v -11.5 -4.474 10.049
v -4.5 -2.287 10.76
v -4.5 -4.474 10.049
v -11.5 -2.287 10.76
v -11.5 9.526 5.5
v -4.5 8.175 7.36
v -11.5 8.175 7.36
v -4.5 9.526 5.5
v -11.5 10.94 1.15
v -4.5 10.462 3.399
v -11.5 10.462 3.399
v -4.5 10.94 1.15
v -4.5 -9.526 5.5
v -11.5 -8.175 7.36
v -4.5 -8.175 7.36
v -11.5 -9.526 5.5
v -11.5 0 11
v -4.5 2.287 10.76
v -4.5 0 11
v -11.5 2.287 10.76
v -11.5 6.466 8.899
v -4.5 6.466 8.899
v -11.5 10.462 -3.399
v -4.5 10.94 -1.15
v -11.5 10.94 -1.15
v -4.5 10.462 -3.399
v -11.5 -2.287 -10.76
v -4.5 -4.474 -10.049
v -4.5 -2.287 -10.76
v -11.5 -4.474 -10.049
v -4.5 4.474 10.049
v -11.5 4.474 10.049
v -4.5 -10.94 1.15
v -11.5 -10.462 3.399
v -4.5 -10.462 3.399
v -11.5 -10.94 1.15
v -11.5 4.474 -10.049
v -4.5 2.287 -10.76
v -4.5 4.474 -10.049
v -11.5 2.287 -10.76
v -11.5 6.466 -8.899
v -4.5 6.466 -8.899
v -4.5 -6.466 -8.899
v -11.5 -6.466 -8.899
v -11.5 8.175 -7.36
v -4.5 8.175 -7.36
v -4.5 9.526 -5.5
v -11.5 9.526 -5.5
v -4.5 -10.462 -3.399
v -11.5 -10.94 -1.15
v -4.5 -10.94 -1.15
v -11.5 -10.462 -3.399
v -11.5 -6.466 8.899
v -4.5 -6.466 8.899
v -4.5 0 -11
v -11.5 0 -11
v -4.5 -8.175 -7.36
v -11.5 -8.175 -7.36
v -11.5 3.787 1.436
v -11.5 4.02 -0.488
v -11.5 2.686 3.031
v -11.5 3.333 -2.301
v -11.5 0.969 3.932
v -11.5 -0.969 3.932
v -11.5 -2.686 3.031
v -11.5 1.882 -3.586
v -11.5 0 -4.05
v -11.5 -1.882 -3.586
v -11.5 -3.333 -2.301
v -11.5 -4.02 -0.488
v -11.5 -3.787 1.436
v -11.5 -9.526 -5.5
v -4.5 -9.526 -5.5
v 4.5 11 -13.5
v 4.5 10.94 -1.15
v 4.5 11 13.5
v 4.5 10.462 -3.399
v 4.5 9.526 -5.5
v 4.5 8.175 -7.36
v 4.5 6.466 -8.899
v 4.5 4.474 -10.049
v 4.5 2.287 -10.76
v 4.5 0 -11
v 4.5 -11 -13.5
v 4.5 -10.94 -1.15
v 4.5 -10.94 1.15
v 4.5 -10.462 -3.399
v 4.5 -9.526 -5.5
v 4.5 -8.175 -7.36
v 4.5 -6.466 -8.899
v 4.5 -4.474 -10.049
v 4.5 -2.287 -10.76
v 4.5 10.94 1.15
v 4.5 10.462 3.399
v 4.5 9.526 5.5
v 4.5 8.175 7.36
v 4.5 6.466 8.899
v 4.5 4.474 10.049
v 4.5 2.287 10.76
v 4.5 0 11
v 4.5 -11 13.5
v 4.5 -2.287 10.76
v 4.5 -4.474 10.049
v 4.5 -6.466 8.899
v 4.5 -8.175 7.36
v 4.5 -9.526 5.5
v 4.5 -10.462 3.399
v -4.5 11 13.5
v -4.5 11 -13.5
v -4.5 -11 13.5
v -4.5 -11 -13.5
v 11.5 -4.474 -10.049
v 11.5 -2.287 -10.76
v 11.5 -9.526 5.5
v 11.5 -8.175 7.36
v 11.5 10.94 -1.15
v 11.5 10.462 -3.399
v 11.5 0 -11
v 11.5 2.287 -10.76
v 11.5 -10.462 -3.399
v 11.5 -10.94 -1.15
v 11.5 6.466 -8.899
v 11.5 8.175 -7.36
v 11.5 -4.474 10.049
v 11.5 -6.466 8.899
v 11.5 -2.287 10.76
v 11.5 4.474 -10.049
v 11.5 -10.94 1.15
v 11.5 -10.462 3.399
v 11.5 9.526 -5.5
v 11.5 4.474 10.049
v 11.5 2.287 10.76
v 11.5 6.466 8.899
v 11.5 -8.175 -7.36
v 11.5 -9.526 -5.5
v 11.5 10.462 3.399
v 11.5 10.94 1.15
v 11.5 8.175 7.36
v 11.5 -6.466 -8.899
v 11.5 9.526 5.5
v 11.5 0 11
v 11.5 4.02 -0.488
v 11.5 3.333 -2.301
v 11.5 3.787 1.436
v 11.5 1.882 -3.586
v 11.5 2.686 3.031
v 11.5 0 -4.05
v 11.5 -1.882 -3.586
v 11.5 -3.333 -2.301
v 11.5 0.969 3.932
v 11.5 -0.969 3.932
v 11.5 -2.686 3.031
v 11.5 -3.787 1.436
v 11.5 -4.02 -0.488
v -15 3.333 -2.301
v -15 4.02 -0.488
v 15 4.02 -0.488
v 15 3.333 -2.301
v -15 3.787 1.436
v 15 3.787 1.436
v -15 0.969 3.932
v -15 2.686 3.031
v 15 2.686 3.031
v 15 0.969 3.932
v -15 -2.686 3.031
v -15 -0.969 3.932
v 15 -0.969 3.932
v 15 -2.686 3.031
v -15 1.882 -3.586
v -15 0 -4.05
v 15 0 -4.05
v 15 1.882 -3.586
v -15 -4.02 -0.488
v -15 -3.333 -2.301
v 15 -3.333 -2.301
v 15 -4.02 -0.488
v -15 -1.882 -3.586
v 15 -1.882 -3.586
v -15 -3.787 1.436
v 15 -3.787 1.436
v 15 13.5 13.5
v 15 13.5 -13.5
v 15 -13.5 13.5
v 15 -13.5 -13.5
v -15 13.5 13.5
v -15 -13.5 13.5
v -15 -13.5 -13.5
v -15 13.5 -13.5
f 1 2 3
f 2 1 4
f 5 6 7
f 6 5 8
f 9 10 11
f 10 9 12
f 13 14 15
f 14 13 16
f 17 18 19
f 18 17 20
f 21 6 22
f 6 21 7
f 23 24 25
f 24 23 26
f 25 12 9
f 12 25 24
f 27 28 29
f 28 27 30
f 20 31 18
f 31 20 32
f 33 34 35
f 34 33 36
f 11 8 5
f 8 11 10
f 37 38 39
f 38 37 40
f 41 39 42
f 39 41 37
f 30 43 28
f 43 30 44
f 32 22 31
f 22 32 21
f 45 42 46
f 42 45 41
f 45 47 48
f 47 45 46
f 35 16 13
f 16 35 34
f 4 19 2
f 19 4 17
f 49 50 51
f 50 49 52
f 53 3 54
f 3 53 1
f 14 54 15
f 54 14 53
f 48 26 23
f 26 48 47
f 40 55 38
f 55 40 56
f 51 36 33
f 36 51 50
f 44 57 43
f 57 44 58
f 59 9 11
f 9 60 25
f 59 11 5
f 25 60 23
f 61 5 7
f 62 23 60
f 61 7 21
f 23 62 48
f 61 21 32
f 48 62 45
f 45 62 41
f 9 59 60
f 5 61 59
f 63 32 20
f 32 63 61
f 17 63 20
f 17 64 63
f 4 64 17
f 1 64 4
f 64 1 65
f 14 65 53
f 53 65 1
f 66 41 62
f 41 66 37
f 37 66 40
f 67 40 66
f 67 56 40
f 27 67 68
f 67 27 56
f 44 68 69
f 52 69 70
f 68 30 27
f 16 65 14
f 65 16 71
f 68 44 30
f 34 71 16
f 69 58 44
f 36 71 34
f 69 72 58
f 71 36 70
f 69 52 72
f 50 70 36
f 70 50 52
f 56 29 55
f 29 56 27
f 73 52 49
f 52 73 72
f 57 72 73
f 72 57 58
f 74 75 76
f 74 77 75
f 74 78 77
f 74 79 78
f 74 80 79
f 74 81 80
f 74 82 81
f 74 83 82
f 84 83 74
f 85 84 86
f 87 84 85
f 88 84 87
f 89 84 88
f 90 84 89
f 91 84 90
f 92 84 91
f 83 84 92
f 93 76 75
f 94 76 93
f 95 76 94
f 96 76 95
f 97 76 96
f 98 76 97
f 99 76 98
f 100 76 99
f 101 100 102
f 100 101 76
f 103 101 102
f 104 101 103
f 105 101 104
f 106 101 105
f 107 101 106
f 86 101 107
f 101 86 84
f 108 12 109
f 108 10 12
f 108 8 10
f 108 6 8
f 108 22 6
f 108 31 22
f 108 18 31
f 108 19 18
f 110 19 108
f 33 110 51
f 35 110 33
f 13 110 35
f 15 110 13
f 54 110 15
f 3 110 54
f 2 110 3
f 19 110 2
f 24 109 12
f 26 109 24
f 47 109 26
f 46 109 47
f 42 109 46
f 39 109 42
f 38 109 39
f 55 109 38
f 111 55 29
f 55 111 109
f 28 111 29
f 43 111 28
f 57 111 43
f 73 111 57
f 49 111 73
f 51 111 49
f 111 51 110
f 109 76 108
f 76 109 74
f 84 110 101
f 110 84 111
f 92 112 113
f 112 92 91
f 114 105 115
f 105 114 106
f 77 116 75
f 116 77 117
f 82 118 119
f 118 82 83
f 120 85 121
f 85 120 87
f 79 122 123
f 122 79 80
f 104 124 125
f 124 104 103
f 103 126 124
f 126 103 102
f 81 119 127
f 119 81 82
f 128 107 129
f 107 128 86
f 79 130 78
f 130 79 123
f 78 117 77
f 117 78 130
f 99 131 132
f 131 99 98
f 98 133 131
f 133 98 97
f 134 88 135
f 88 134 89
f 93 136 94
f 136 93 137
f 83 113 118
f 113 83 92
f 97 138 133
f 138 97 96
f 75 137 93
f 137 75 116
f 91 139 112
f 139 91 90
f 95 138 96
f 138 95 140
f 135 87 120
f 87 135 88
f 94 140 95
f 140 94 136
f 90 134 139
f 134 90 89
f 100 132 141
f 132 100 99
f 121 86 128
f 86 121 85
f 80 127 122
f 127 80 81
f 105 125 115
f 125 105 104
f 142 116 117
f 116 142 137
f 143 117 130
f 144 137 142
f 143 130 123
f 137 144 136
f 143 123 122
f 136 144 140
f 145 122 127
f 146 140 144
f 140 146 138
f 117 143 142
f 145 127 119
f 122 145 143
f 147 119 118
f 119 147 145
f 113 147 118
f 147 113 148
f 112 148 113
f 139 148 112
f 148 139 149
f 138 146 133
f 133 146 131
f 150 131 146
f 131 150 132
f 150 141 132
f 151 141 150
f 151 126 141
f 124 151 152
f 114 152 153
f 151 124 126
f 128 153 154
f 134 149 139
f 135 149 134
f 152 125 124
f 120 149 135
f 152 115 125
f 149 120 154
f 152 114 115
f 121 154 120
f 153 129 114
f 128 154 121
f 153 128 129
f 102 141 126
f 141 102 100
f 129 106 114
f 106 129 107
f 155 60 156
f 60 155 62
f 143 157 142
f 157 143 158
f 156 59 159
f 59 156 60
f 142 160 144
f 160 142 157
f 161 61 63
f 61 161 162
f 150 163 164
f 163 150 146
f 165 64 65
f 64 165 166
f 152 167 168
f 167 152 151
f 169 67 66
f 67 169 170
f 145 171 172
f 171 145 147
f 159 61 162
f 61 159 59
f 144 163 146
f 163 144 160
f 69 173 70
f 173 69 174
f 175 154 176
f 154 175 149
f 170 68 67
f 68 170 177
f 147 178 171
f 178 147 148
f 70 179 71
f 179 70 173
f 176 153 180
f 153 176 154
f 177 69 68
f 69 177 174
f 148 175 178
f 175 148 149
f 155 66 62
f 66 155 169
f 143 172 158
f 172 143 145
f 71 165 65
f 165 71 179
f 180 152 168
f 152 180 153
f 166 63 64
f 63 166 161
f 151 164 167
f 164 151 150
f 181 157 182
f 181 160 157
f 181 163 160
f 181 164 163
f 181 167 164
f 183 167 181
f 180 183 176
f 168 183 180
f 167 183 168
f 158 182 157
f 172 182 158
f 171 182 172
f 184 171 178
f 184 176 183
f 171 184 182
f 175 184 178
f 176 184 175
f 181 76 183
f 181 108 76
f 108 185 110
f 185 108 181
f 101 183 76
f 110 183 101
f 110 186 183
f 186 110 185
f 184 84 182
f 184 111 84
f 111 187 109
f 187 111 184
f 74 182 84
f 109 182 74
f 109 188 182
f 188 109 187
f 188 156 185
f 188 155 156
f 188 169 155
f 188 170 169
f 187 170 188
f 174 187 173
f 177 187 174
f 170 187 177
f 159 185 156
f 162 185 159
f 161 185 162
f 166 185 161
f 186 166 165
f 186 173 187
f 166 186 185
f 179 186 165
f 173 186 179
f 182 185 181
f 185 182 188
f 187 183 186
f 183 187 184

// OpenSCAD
module bearing(){
	color([1,1,1]*0.75) difference(){
		translate([0,0,-0.5]) cylinder(r=22/2,h=7.5);
//		cylinder(r=8.1/2,h=20,center=true);
	}
}
difference(){
	cube([30,27,27],center=true);
	union(){
		translate([-9/2,0,0]) rotate([0,-90,0]) bearing();
		cube([9,22,40],center=true);
		translate([9/2,0,0]) rotate([0,90,0]) bearing();
		rotate([0,90,0]) cylinder(r=8.1/2,h=100,center=true);
	}
}
//square(100,center=true);
